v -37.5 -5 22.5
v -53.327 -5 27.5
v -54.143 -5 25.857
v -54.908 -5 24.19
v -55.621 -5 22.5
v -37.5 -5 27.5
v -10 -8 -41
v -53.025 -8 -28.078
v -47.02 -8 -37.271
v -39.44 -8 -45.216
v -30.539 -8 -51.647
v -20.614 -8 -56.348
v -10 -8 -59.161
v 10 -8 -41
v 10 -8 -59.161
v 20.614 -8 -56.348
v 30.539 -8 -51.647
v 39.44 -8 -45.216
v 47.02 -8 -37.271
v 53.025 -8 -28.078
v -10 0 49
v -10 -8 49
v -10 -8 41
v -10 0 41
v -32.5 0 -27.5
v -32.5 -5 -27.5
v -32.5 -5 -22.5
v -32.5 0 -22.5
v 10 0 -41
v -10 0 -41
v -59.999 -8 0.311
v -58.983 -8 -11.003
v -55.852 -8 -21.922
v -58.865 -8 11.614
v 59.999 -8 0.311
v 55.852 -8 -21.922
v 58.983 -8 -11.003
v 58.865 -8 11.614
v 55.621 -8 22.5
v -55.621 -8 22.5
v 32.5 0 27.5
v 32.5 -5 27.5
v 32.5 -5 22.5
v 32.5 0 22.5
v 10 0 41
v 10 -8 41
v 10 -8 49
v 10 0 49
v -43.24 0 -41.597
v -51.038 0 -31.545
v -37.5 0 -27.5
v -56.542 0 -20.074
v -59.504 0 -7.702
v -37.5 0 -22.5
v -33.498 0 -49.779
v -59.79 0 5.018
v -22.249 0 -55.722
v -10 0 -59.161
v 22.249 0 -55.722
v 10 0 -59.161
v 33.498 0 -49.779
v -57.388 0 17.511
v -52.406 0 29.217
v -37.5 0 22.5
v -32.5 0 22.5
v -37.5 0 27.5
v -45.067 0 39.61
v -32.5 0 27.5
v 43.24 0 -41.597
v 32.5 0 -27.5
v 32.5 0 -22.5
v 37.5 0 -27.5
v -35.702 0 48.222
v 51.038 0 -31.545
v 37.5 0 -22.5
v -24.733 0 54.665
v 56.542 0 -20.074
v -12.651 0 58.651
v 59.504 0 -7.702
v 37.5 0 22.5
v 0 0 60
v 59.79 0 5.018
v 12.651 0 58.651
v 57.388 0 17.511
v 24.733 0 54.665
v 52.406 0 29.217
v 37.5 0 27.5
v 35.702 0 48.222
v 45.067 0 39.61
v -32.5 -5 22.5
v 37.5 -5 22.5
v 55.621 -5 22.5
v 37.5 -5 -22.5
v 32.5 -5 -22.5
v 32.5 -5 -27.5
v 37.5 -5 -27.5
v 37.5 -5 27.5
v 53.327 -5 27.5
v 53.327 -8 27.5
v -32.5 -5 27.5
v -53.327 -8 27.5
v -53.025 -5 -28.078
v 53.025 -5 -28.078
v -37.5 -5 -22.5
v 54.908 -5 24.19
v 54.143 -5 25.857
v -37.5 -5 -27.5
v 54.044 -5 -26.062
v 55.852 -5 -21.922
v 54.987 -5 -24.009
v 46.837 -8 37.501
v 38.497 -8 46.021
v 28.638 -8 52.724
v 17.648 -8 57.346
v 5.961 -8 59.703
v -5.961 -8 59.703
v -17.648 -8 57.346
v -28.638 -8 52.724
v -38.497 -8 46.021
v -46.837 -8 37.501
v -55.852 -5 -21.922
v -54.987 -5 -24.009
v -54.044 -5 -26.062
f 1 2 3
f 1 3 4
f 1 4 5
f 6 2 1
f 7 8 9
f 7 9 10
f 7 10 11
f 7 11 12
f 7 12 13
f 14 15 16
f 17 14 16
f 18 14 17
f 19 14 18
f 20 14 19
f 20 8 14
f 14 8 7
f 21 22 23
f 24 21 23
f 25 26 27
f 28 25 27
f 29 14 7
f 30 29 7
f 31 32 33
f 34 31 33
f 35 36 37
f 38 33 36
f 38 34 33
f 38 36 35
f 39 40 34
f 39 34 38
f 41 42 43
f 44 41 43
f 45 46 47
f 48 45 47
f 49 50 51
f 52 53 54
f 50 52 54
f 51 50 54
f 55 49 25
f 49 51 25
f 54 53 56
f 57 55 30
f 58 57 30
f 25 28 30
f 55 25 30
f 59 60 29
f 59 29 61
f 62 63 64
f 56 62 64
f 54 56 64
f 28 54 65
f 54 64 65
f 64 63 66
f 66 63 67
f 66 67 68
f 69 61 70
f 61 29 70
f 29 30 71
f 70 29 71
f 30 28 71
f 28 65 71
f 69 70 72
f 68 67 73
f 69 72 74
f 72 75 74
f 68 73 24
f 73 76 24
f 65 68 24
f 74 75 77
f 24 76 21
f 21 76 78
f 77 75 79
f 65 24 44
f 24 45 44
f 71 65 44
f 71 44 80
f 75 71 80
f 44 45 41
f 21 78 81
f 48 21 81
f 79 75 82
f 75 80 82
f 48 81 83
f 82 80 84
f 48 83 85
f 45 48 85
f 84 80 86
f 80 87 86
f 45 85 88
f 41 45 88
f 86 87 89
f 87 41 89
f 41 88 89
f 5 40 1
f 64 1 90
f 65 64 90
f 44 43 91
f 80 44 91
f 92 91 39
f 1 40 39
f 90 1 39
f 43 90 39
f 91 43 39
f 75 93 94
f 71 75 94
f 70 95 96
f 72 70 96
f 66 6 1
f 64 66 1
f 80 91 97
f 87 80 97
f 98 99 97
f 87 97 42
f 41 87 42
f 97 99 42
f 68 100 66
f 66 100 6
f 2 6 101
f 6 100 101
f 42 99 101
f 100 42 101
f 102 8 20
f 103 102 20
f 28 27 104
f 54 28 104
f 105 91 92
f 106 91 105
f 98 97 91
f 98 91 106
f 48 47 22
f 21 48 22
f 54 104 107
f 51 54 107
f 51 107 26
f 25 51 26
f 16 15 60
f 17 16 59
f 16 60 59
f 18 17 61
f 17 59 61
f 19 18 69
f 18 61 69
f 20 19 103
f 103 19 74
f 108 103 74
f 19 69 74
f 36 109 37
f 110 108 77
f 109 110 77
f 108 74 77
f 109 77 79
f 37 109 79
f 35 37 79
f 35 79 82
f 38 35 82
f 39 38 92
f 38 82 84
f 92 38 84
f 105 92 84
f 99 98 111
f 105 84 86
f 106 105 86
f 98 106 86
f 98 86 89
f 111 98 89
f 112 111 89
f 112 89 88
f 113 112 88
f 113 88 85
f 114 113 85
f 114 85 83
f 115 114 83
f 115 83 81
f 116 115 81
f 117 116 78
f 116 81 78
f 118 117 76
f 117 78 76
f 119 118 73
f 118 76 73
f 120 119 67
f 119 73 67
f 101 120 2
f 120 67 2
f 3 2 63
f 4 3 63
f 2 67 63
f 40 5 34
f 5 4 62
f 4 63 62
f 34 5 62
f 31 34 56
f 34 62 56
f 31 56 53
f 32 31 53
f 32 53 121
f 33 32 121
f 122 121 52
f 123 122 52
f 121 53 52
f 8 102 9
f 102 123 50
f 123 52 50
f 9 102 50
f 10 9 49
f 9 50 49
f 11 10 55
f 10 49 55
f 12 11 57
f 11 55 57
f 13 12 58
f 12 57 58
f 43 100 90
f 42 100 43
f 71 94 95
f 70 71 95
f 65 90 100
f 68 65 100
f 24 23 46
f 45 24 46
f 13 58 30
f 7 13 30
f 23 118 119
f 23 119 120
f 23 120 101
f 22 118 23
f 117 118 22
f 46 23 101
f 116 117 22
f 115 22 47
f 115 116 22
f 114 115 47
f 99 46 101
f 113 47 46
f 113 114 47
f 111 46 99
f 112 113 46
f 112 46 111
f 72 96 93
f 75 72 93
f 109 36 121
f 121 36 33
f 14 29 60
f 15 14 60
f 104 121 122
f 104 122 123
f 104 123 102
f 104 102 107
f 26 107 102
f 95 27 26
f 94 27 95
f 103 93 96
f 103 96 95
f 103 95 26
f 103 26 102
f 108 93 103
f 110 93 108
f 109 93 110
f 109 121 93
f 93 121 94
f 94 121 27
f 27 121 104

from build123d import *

# Parameters (mm, degrees)
F0_R     = 60
F1_DEPTH = 8
F2_W     = 70
F2_H     = 2.5
F2_H_2   = 3.077762
F3_DEPTH = 3
F4_W     = 2.5
F4_H     = 2.5
F5_DEPTH = 8.001
F7_DEPTH = 8.001
F9_DEPTH = 8.001


with BuildPart() as f1:
    # F0 (on Front) → F1 (new body)
    with BuildSketch(Plane.XZ):
        Circle(F0_R)
    extrude(amount=F1_DEPTH)

    # F2 (on face) → F3 (cut)
    with BuildSketch(Plane.XZ.offset(8)):
        with BuildLine():
            Line((-35, 25), (35, 25))
            Line((35, 25), (35, 22.5))
            Line((35, 22.5), (55.621489, 22.5))
            ThreePointArc((55.621489, 22.5), (54.531492, 25.026314), (53.326823, 27.5))
            Line((53.326823, 27.5), (-53.326823, 27.5))
            ThreePointArc((-53.326823, 27.5), (-54.531492, 25.026314), (-55.621489, 22.5))
            Line((-55.621489, 22.5), (-35, 22.5))
            Line((-35, 22.5), (-35, 25))
        make_face()
        with Locations((0, 23.75)):
            Rectangle(F2_W, F2_H)
        with BuildLine():
            Line((55.851728, -21.922238), (35, -21.922238))
            Line((35, -21.922238), (35, -25))
            Line((35, -25), (-35, -25))
            Line((-35, -25), (-35, -21.922238))
            Line((-35, -21.922238), (-55.851728, -21.922238))
            ThreePointArc((-55.851728, -21.922238), (-54.525244, -25.039923), (-53.024893, -28.077762))
            Line((-53.024893, -28.077762), (53.024893, -28.077762))
            ThreePointArc((53.024893, -28.077762), (54.525244, -25.039923), (55.851728, -21.922238))
        make_face()
        with Locations((0, -23.461119)):
            Rectangle(F2_W, F2_H_2)
    extrude(amount=-F3_DEPTH, mode=Mode.SUBTRACT)

    # F4 (on face) → F5 (cut, through all)
    with BuildSketch(Plane.XZ.offset(8)):
        Polygon((-35, 25), (-32.5, 25), (-32.5, 27.5), (-37.5, 27.5), (-37.5, 22.5), (-35, 22.5), align=None)
        with Locations((-33.75, 23.75)):
            Rectangle(F4_W, F4_H)
        Polygon((32.5, 25), (35, 25), (35, 22.5), (37.5, 22.5), (37.5, 27.5), (32.5, 27.5), align=None)
        with Locations((33.75, 23.75)):
            Rectangle(F4_W, F4_H)
        Polygon((37.5, -22.5), (35, -22.5), (35, -25), (32.5, -25), (32.5, -27.5), (37.5, -27.5), align=None)
        with Locations((33.75, -23.75)):
            Rectangle(F4_W, F4_H)
        Polygon((-35, -25), (-35, -22.5), (-37.5, -22.5), (-37.5, -27.5), (-32.5, -27.5), (-32.5, -25), align=None)
        with Locations((-33.75, -23.75)):
            Rectangle(F4_W, F4_H)
    extrude(amount=-F5_DEPTH, mode=Mode.SUBTRACT)

    # F6 (on face) → F7 (cut, through all)
    with BuildSketch(Plane.XZ.offset(8)):
        Polygon((-10, 41), (0, 41), (10, 41), (10, 49), (-10, 49), align=None)
        Polygon((10, -41), (0, -41), (-10, -41), (-10, -49), (10, -49), align=None)
    extrude(amount=-F7_DEPTH, mode=Mode.SUBTRACT)

    # F8 (on face) → F9 (cut, through all)
    with BuildSketch(Plane(origin=(0, 0, 0), x_dir=(-1, 0, 0), z_dir=(0, 1, 0))):
        with BuildLine():
            Line((10, -49), (-10, -49))
            Line((-10, -49), (-10, -59.160798))
            ThreePointArc((-10, -59.160798), (0, -60), (10, -59.160798))
            Line((10, -59.160798), (10, -49))
        make_face()
    extrude(amount=-F9_DEPTH, mode=Mode.SUBTRACT)


solid = f1.part
